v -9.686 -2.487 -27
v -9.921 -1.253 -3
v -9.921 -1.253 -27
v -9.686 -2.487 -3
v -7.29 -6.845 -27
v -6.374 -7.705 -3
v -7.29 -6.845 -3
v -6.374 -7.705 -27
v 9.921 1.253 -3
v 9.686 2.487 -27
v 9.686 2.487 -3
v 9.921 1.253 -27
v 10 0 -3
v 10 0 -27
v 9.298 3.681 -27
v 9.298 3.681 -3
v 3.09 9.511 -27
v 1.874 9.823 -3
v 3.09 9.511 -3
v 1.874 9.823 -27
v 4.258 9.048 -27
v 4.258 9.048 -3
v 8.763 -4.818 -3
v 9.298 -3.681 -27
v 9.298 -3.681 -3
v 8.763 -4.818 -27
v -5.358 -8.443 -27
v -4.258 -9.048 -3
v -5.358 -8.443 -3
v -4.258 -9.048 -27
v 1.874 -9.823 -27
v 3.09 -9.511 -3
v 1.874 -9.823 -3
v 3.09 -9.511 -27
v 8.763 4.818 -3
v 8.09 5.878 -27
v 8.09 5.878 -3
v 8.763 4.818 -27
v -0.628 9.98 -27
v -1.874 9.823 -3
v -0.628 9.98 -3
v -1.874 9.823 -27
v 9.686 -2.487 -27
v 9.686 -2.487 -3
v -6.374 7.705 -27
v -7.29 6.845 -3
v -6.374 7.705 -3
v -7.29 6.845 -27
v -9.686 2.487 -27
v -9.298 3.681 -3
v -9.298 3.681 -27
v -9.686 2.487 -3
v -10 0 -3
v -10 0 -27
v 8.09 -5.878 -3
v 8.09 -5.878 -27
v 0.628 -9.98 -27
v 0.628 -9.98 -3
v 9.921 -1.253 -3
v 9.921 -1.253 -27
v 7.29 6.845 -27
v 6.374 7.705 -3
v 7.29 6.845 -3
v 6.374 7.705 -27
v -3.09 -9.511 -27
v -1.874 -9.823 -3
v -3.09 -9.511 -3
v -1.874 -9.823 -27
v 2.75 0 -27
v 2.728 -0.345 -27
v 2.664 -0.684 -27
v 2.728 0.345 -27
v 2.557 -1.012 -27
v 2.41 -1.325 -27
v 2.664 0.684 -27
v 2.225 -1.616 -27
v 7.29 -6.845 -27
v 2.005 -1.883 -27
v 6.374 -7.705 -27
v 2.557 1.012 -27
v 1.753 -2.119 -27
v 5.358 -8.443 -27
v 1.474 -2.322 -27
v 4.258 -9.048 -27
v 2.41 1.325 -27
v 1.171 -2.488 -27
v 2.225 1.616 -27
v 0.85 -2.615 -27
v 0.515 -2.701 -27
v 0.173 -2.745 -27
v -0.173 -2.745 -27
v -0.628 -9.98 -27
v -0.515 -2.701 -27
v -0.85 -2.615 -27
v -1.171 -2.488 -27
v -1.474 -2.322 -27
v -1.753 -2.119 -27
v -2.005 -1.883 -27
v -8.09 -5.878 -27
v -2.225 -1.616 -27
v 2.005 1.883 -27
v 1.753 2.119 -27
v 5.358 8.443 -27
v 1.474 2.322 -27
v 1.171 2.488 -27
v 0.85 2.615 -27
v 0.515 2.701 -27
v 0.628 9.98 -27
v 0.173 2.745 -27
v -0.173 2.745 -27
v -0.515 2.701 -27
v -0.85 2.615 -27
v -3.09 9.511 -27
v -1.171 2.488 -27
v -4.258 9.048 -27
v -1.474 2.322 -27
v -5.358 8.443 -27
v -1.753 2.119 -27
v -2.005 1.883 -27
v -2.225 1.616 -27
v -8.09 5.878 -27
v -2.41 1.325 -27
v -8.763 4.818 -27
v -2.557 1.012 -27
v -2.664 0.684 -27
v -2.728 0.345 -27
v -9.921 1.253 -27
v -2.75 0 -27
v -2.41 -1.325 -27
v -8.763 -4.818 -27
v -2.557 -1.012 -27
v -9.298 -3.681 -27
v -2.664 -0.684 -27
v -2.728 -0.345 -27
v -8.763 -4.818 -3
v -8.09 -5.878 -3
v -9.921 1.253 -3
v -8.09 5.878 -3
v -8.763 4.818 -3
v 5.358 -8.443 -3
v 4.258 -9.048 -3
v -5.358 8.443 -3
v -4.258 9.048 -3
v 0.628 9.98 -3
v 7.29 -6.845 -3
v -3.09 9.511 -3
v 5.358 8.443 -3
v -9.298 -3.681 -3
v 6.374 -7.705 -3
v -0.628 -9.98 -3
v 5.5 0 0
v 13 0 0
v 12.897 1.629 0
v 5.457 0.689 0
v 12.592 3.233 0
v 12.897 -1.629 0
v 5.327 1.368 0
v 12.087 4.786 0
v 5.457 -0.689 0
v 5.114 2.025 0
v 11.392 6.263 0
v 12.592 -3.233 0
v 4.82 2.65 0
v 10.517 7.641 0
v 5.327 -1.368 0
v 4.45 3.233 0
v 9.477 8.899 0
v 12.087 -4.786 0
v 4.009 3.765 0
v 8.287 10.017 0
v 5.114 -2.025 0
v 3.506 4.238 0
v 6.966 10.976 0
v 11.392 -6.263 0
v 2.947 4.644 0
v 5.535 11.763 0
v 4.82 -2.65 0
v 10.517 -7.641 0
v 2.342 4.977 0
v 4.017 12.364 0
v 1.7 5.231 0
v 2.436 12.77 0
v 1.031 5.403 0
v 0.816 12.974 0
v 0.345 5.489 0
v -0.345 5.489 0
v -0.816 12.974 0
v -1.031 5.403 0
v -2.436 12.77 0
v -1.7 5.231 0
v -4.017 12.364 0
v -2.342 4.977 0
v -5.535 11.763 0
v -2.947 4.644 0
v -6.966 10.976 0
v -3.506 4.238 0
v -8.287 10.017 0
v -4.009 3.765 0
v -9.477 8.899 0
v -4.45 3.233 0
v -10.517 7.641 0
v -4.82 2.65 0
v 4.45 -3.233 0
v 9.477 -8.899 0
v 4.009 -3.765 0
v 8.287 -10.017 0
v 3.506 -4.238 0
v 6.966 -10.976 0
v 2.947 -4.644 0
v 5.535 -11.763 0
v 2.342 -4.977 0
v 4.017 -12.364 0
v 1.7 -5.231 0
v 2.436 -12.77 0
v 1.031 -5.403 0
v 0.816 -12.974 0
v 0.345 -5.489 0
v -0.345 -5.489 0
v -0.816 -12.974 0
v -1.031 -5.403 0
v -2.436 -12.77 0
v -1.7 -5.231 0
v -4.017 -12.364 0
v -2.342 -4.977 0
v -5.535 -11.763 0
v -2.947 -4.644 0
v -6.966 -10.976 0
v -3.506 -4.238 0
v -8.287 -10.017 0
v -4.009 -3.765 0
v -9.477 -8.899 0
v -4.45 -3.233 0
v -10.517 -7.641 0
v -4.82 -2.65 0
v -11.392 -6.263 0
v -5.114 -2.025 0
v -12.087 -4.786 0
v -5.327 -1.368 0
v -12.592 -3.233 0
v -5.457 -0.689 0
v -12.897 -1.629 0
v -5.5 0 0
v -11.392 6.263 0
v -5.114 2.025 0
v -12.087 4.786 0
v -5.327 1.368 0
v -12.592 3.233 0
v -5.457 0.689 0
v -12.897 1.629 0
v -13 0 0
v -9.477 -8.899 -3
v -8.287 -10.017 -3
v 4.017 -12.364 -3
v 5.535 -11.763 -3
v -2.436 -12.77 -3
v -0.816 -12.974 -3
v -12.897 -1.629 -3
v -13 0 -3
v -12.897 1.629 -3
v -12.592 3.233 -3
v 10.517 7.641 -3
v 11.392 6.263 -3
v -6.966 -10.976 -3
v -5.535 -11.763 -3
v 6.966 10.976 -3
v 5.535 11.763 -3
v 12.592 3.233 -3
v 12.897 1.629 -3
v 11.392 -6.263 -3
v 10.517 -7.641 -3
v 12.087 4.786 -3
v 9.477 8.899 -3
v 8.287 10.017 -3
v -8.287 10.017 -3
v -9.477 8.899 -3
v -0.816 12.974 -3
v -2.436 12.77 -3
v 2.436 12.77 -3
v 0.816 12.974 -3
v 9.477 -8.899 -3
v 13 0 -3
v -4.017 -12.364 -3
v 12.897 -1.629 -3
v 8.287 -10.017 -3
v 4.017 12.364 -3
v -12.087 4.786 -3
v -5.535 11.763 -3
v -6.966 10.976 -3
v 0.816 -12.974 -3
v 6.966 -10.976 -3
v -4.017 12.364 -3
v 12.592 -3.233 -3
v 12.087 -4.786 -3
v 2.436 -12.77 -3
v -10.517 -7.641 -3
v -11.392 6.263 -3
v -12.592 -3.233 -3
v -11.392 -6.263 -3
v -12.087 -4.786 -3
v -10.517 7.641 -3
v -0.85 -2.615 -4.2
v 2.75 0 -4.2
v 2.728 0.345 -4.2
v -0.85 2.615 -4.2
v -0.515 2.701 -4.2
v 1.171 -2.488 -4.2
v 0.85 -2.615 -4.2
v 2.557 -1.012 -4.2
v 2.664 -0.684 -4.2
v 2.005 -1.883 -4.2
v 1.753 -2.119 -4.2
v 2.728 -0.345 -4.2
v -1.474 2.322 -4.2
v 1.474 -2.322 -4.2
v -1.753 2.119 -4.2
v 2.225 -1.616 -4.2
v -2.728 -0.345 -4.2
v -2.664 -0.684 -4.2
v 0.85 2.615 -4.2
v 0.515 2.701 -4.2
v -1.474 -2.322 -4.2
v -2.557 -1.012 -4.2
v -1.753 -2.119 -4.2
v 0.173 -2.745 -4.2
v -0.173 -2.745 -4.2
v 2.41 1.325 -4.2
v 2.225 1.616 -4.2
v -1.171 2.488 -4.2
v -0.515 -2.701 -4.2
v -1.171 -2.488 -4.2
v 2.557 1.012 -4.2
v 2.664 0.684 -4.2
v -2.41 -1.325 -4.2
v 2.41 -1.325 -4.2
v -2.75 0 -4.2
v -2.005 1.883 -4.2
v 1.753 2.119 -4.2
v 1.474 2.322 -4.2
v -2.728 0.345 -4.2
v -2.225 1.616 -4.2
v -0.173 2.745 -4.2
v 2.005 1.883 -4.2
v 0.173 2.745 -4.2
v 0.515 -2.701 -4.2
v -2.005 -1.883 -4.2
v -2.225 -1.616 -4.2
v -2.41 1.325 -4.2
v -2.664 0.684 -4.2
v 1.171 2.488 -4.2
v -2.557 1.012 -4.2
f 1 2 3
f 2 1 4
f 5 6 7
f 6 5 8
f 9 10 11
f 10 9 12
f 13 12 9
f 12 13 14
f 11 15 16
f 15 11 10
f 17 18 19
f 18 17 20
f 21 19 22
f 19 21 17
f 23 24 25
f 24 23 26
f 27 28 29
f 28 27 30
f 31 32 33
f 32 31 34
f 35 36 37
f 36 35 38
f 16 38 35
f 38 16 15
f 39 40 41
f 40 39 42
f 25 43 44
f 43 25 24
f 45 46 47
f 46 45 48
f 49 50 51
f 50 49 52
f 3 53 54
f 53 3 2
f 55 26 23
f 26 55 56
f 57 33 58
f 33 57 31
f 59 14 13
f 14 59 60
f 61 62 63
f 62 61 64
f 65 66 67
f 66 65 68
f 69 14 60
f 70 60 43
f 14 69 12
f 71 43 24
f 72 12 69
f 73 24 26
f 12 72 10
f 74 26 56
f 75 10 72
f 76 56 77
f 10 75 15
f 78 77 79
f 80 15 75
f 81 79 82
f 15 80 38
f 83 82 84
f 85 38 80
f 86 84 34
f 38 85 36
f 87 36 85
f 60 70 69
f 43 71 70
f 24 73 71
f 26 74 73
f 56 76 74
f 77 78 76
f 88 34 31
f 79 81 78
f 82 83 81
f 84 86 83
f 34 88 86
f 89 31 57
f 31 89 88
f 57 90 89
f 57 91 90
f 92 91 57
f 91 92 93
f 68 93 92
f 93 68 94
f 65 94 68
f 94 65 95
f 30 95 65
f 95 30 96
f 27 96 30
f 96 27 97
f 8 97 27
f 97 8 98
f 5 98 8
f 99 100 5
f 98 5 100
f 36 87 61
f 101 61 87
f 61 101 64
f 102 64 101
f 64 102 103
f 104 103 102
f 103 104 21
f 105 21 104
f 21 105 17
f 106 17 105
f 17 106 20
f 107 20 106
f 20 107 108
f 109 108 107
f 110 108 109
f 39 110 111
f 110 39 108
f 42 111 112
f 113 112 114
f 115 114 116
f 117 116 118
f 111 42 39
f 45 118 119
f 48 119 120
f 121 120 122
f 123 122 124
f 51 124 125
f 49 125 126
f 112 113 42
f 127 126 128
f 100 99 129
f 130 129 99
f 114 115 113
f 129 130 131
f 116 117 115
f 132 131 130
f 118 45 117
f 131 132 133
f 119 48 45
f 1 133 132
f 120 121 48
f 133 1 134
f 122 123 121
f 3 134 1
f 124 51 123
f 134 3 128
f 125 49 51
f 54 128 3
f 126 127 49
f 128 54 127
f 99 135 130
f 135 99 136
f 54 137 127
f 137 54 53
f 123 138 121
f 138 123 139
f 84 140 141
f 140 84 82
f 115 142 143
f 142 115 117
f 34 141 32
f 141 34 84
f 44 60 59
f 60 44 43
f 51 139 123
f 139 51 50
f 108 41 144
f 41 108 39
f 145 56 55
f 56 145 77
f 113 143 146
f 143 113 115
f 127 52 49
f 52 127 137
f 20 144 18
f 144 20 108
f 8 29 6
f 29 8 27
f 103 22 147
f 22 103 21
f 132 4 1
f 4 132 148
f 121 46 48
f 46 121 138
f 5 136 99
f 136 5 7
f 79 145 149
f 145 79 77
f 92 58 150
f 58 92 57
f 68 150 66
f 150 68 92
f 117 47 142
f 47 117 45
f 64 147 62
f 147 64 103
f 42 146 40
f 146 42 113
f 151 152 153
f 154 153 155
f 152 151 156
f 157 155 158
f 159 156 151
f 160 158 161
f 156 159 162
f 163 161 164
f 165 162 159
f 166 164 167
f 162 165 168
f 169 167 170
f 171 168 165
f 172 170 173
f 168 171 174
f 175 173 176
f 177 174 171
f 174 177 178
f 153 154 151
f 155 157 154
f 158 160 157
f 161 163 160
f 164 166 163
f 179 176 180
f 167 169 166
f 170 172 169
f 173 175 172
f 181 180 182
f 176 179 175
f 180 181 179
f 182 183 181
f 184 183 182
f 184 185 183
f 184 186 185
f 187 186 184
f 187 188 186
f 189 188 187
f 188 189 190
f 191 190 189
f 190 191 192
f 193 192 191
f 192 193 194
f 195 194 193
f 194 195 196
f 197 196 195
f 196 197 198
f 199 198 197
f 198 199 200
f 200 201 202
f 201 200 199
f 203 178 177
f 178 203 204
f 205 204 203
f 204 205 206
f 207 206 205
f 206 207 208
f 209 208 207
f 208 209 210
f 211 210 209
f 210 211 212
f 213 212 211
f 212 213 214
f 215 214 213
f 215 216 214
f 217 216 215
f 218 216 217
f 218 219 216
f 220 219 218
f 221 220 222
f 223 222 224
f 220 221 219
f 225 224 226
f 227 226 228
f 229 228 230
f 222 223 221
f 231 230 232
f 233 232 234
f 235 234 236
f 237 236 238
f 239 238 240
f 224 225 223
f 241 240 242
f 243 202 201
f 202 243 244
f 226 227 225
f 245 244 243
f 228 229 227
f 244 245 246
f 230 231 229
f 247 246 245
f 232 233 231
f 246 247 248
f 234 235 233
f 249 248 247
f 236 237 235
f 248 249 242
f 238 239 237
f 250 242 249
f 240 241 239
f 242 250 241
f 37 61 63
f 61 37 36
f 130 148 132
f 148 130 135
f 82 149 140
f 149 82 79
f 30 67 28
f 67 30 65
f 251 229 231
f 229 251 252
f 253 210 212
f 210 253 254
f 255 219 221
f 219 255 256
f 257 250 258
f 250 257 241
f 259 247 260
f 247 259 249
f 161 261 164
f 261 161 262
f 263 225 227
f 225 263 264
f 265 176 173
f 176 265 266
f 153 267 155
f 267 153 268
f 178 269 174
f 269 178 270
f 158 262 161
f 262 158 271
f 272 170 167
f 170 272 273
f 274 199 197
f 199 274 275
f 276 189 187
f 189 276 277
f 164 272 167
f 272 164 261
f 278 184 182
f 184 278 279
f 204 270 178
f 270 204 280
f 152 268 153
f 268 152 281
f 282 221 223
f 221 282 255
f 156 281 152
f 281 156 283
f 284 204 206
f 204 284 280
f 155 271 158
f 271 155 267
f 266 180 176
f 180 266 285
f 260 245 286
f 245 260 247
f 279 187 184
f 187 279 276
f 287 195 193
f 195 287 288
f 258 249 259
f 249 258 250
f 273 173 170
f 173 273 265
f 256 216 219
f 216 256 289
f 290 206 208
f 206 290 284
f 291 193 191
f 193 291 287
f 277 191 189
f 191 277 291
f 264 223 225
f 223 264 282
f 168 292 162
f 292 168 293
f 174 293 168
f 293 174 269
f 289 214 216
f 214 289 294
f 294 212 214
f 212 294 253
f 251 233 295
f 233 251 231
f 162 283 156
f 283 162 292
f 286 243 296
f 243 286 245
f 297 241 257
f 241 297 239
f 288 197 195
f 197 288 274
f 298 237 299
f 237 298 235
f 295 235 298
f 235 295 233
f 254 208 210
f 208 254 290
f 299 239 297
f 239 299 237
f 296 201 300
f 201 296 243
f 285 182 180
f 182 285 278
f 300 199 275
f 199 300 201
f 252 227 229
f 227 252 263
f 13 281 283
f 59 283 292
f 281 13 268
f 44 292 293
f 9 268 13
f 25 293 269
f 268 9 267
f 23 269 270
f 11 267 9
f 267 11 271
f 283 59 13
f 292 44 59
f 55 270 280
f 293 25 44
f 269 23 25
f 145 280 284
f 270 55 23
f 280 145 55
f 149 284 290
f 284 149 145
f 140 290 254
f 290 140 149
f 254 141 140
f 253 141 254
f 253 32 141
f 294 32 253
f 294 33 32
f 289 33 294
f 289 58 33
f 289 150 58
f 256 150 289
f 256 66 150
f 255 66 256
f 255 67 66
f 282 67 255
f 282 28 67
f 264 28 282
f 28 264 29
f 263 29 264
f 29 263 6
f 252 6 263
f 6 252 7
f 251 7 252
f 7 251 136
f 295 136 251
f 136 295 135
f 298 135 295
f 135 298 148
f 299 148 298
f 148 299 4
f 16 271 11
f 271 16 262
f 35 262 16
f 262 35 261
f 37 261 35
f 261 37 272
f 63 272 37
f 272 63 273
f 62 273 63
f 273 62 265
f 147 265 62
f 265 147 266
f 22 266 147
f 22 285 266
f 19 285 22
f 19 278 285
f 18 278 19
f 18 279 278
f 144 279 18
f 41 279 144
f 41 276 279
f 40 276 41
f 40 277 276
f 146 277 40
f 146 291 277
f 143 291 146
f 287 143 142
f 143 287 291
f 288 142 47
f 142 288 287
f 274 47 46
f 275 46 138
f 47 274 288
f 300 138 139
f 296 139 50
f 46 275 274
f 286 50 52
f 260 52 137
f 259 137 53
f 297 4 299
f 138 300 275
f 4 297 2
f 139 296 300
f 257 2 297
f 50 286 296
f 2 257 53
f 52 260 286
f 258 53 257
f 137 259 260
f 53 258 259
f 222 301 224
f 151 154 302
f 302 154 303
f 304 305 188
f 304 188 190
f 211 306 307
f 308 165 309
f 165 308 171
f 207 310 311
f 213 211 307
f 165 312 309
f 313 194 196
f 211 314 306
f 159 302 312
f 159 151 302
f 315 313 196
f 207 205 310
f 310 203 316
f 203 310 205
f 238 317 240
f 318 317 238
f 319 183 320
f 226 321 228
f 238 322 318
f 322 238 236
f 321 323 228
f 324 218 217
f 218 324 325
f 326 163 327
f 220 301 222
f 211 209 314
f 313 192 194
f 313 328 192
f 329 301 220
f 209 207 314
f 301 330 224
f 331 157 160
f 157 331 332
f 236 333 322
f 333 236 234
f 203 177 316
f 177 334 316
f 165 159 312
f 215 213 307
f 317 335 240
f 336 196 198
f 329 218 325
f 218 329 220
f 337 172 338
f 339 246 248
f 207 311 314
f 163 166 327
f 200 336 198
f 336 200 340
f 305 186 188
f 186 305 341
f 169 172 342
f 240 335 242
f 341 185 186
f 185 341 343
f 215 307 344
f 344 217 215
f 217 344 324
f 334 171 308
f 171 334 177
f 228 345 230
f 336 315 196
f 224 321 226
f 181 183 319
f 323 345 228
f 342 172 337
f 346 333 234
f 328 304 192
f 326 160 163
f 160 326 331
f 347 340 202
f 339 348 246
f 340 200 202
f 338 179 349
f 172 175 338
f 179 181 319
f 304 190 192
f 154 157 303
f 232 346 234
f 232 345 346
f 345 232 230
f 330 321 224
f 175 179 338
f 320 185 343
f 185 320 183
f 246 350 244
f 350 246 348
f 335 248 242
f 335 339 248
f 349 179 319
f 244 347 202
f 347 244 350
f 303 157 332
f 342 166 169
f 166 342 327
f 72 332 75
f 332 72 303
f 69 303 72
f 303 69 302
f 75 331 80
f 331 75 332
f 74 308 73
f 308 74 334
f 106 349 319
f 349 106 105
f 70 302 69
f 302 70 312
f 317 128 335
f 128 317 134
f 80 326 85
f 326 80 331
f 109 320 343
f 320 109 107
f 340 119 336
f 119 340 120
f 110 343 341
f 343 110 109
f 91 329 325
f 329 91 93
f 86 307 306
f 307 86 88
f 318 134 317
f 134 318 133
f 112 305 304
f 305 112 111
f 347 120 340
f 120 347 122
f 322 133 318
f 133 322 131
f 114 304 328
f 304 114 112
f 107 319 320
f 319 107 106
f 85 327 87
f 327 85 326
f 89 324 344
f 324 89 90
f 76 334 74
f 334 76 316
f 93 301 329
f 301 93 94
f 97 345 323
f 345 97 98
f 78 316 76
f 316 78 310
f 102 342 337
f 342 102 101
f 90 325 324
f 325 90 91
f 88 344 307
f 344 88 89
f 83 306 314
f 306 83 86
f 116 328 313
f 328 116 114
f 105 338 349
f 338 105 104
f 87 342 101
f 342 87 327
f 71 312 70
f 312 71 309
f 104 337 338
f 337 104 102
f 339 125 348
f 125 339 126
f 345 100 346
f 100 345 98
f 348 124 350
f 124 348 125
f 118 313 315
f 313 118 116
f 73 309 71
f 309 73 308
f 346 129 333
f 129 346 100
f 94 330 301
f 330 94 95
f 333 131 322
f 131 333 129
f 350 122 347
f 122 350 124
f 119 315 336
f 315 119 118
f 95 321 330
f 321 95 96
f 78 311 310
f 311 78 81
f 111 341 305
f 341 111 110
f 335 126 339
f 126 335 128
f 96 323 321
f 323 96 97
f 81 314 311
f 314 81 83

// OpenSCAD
$fn = 50;


difference() {
	union() {
		translate(v = [0, 0, -27.0000000000]) {
			cylinder(h = 27, r = 10.0000000000);
		}
		translate(v = [0, 0, -3.0000000000]) {
			cylinder(h = 3, r = 13.0000000000);
		}
	}
	union() {
		translate(v = [0, 0, 0]) {
			rotate(a = [0, 0, 0]) {
				difference() {
					union() {
						#translate(v = [0, 0, -27.0000000000]) {
							cylinder(h = 27, r = 2.2500000000);
						}
						#translate(v = [0, 0, -4.2000000000]) {
							cylinder(h = 4.2000000000, r = 10.0000000000, r1 = 2.7500000000, r2 = 5.5000000000);
						}
						#translate(v = [0, 0, -27.0000000000]) {
							cylinder(h = 27, r = 2.7500000000);
						}
						#translate(v = [0, 0, -27.0000000000]) {
							cylinder(h = 27, r = 2.2500000000);
						}
					}
					union();
				}
			}
		}
	}
}
